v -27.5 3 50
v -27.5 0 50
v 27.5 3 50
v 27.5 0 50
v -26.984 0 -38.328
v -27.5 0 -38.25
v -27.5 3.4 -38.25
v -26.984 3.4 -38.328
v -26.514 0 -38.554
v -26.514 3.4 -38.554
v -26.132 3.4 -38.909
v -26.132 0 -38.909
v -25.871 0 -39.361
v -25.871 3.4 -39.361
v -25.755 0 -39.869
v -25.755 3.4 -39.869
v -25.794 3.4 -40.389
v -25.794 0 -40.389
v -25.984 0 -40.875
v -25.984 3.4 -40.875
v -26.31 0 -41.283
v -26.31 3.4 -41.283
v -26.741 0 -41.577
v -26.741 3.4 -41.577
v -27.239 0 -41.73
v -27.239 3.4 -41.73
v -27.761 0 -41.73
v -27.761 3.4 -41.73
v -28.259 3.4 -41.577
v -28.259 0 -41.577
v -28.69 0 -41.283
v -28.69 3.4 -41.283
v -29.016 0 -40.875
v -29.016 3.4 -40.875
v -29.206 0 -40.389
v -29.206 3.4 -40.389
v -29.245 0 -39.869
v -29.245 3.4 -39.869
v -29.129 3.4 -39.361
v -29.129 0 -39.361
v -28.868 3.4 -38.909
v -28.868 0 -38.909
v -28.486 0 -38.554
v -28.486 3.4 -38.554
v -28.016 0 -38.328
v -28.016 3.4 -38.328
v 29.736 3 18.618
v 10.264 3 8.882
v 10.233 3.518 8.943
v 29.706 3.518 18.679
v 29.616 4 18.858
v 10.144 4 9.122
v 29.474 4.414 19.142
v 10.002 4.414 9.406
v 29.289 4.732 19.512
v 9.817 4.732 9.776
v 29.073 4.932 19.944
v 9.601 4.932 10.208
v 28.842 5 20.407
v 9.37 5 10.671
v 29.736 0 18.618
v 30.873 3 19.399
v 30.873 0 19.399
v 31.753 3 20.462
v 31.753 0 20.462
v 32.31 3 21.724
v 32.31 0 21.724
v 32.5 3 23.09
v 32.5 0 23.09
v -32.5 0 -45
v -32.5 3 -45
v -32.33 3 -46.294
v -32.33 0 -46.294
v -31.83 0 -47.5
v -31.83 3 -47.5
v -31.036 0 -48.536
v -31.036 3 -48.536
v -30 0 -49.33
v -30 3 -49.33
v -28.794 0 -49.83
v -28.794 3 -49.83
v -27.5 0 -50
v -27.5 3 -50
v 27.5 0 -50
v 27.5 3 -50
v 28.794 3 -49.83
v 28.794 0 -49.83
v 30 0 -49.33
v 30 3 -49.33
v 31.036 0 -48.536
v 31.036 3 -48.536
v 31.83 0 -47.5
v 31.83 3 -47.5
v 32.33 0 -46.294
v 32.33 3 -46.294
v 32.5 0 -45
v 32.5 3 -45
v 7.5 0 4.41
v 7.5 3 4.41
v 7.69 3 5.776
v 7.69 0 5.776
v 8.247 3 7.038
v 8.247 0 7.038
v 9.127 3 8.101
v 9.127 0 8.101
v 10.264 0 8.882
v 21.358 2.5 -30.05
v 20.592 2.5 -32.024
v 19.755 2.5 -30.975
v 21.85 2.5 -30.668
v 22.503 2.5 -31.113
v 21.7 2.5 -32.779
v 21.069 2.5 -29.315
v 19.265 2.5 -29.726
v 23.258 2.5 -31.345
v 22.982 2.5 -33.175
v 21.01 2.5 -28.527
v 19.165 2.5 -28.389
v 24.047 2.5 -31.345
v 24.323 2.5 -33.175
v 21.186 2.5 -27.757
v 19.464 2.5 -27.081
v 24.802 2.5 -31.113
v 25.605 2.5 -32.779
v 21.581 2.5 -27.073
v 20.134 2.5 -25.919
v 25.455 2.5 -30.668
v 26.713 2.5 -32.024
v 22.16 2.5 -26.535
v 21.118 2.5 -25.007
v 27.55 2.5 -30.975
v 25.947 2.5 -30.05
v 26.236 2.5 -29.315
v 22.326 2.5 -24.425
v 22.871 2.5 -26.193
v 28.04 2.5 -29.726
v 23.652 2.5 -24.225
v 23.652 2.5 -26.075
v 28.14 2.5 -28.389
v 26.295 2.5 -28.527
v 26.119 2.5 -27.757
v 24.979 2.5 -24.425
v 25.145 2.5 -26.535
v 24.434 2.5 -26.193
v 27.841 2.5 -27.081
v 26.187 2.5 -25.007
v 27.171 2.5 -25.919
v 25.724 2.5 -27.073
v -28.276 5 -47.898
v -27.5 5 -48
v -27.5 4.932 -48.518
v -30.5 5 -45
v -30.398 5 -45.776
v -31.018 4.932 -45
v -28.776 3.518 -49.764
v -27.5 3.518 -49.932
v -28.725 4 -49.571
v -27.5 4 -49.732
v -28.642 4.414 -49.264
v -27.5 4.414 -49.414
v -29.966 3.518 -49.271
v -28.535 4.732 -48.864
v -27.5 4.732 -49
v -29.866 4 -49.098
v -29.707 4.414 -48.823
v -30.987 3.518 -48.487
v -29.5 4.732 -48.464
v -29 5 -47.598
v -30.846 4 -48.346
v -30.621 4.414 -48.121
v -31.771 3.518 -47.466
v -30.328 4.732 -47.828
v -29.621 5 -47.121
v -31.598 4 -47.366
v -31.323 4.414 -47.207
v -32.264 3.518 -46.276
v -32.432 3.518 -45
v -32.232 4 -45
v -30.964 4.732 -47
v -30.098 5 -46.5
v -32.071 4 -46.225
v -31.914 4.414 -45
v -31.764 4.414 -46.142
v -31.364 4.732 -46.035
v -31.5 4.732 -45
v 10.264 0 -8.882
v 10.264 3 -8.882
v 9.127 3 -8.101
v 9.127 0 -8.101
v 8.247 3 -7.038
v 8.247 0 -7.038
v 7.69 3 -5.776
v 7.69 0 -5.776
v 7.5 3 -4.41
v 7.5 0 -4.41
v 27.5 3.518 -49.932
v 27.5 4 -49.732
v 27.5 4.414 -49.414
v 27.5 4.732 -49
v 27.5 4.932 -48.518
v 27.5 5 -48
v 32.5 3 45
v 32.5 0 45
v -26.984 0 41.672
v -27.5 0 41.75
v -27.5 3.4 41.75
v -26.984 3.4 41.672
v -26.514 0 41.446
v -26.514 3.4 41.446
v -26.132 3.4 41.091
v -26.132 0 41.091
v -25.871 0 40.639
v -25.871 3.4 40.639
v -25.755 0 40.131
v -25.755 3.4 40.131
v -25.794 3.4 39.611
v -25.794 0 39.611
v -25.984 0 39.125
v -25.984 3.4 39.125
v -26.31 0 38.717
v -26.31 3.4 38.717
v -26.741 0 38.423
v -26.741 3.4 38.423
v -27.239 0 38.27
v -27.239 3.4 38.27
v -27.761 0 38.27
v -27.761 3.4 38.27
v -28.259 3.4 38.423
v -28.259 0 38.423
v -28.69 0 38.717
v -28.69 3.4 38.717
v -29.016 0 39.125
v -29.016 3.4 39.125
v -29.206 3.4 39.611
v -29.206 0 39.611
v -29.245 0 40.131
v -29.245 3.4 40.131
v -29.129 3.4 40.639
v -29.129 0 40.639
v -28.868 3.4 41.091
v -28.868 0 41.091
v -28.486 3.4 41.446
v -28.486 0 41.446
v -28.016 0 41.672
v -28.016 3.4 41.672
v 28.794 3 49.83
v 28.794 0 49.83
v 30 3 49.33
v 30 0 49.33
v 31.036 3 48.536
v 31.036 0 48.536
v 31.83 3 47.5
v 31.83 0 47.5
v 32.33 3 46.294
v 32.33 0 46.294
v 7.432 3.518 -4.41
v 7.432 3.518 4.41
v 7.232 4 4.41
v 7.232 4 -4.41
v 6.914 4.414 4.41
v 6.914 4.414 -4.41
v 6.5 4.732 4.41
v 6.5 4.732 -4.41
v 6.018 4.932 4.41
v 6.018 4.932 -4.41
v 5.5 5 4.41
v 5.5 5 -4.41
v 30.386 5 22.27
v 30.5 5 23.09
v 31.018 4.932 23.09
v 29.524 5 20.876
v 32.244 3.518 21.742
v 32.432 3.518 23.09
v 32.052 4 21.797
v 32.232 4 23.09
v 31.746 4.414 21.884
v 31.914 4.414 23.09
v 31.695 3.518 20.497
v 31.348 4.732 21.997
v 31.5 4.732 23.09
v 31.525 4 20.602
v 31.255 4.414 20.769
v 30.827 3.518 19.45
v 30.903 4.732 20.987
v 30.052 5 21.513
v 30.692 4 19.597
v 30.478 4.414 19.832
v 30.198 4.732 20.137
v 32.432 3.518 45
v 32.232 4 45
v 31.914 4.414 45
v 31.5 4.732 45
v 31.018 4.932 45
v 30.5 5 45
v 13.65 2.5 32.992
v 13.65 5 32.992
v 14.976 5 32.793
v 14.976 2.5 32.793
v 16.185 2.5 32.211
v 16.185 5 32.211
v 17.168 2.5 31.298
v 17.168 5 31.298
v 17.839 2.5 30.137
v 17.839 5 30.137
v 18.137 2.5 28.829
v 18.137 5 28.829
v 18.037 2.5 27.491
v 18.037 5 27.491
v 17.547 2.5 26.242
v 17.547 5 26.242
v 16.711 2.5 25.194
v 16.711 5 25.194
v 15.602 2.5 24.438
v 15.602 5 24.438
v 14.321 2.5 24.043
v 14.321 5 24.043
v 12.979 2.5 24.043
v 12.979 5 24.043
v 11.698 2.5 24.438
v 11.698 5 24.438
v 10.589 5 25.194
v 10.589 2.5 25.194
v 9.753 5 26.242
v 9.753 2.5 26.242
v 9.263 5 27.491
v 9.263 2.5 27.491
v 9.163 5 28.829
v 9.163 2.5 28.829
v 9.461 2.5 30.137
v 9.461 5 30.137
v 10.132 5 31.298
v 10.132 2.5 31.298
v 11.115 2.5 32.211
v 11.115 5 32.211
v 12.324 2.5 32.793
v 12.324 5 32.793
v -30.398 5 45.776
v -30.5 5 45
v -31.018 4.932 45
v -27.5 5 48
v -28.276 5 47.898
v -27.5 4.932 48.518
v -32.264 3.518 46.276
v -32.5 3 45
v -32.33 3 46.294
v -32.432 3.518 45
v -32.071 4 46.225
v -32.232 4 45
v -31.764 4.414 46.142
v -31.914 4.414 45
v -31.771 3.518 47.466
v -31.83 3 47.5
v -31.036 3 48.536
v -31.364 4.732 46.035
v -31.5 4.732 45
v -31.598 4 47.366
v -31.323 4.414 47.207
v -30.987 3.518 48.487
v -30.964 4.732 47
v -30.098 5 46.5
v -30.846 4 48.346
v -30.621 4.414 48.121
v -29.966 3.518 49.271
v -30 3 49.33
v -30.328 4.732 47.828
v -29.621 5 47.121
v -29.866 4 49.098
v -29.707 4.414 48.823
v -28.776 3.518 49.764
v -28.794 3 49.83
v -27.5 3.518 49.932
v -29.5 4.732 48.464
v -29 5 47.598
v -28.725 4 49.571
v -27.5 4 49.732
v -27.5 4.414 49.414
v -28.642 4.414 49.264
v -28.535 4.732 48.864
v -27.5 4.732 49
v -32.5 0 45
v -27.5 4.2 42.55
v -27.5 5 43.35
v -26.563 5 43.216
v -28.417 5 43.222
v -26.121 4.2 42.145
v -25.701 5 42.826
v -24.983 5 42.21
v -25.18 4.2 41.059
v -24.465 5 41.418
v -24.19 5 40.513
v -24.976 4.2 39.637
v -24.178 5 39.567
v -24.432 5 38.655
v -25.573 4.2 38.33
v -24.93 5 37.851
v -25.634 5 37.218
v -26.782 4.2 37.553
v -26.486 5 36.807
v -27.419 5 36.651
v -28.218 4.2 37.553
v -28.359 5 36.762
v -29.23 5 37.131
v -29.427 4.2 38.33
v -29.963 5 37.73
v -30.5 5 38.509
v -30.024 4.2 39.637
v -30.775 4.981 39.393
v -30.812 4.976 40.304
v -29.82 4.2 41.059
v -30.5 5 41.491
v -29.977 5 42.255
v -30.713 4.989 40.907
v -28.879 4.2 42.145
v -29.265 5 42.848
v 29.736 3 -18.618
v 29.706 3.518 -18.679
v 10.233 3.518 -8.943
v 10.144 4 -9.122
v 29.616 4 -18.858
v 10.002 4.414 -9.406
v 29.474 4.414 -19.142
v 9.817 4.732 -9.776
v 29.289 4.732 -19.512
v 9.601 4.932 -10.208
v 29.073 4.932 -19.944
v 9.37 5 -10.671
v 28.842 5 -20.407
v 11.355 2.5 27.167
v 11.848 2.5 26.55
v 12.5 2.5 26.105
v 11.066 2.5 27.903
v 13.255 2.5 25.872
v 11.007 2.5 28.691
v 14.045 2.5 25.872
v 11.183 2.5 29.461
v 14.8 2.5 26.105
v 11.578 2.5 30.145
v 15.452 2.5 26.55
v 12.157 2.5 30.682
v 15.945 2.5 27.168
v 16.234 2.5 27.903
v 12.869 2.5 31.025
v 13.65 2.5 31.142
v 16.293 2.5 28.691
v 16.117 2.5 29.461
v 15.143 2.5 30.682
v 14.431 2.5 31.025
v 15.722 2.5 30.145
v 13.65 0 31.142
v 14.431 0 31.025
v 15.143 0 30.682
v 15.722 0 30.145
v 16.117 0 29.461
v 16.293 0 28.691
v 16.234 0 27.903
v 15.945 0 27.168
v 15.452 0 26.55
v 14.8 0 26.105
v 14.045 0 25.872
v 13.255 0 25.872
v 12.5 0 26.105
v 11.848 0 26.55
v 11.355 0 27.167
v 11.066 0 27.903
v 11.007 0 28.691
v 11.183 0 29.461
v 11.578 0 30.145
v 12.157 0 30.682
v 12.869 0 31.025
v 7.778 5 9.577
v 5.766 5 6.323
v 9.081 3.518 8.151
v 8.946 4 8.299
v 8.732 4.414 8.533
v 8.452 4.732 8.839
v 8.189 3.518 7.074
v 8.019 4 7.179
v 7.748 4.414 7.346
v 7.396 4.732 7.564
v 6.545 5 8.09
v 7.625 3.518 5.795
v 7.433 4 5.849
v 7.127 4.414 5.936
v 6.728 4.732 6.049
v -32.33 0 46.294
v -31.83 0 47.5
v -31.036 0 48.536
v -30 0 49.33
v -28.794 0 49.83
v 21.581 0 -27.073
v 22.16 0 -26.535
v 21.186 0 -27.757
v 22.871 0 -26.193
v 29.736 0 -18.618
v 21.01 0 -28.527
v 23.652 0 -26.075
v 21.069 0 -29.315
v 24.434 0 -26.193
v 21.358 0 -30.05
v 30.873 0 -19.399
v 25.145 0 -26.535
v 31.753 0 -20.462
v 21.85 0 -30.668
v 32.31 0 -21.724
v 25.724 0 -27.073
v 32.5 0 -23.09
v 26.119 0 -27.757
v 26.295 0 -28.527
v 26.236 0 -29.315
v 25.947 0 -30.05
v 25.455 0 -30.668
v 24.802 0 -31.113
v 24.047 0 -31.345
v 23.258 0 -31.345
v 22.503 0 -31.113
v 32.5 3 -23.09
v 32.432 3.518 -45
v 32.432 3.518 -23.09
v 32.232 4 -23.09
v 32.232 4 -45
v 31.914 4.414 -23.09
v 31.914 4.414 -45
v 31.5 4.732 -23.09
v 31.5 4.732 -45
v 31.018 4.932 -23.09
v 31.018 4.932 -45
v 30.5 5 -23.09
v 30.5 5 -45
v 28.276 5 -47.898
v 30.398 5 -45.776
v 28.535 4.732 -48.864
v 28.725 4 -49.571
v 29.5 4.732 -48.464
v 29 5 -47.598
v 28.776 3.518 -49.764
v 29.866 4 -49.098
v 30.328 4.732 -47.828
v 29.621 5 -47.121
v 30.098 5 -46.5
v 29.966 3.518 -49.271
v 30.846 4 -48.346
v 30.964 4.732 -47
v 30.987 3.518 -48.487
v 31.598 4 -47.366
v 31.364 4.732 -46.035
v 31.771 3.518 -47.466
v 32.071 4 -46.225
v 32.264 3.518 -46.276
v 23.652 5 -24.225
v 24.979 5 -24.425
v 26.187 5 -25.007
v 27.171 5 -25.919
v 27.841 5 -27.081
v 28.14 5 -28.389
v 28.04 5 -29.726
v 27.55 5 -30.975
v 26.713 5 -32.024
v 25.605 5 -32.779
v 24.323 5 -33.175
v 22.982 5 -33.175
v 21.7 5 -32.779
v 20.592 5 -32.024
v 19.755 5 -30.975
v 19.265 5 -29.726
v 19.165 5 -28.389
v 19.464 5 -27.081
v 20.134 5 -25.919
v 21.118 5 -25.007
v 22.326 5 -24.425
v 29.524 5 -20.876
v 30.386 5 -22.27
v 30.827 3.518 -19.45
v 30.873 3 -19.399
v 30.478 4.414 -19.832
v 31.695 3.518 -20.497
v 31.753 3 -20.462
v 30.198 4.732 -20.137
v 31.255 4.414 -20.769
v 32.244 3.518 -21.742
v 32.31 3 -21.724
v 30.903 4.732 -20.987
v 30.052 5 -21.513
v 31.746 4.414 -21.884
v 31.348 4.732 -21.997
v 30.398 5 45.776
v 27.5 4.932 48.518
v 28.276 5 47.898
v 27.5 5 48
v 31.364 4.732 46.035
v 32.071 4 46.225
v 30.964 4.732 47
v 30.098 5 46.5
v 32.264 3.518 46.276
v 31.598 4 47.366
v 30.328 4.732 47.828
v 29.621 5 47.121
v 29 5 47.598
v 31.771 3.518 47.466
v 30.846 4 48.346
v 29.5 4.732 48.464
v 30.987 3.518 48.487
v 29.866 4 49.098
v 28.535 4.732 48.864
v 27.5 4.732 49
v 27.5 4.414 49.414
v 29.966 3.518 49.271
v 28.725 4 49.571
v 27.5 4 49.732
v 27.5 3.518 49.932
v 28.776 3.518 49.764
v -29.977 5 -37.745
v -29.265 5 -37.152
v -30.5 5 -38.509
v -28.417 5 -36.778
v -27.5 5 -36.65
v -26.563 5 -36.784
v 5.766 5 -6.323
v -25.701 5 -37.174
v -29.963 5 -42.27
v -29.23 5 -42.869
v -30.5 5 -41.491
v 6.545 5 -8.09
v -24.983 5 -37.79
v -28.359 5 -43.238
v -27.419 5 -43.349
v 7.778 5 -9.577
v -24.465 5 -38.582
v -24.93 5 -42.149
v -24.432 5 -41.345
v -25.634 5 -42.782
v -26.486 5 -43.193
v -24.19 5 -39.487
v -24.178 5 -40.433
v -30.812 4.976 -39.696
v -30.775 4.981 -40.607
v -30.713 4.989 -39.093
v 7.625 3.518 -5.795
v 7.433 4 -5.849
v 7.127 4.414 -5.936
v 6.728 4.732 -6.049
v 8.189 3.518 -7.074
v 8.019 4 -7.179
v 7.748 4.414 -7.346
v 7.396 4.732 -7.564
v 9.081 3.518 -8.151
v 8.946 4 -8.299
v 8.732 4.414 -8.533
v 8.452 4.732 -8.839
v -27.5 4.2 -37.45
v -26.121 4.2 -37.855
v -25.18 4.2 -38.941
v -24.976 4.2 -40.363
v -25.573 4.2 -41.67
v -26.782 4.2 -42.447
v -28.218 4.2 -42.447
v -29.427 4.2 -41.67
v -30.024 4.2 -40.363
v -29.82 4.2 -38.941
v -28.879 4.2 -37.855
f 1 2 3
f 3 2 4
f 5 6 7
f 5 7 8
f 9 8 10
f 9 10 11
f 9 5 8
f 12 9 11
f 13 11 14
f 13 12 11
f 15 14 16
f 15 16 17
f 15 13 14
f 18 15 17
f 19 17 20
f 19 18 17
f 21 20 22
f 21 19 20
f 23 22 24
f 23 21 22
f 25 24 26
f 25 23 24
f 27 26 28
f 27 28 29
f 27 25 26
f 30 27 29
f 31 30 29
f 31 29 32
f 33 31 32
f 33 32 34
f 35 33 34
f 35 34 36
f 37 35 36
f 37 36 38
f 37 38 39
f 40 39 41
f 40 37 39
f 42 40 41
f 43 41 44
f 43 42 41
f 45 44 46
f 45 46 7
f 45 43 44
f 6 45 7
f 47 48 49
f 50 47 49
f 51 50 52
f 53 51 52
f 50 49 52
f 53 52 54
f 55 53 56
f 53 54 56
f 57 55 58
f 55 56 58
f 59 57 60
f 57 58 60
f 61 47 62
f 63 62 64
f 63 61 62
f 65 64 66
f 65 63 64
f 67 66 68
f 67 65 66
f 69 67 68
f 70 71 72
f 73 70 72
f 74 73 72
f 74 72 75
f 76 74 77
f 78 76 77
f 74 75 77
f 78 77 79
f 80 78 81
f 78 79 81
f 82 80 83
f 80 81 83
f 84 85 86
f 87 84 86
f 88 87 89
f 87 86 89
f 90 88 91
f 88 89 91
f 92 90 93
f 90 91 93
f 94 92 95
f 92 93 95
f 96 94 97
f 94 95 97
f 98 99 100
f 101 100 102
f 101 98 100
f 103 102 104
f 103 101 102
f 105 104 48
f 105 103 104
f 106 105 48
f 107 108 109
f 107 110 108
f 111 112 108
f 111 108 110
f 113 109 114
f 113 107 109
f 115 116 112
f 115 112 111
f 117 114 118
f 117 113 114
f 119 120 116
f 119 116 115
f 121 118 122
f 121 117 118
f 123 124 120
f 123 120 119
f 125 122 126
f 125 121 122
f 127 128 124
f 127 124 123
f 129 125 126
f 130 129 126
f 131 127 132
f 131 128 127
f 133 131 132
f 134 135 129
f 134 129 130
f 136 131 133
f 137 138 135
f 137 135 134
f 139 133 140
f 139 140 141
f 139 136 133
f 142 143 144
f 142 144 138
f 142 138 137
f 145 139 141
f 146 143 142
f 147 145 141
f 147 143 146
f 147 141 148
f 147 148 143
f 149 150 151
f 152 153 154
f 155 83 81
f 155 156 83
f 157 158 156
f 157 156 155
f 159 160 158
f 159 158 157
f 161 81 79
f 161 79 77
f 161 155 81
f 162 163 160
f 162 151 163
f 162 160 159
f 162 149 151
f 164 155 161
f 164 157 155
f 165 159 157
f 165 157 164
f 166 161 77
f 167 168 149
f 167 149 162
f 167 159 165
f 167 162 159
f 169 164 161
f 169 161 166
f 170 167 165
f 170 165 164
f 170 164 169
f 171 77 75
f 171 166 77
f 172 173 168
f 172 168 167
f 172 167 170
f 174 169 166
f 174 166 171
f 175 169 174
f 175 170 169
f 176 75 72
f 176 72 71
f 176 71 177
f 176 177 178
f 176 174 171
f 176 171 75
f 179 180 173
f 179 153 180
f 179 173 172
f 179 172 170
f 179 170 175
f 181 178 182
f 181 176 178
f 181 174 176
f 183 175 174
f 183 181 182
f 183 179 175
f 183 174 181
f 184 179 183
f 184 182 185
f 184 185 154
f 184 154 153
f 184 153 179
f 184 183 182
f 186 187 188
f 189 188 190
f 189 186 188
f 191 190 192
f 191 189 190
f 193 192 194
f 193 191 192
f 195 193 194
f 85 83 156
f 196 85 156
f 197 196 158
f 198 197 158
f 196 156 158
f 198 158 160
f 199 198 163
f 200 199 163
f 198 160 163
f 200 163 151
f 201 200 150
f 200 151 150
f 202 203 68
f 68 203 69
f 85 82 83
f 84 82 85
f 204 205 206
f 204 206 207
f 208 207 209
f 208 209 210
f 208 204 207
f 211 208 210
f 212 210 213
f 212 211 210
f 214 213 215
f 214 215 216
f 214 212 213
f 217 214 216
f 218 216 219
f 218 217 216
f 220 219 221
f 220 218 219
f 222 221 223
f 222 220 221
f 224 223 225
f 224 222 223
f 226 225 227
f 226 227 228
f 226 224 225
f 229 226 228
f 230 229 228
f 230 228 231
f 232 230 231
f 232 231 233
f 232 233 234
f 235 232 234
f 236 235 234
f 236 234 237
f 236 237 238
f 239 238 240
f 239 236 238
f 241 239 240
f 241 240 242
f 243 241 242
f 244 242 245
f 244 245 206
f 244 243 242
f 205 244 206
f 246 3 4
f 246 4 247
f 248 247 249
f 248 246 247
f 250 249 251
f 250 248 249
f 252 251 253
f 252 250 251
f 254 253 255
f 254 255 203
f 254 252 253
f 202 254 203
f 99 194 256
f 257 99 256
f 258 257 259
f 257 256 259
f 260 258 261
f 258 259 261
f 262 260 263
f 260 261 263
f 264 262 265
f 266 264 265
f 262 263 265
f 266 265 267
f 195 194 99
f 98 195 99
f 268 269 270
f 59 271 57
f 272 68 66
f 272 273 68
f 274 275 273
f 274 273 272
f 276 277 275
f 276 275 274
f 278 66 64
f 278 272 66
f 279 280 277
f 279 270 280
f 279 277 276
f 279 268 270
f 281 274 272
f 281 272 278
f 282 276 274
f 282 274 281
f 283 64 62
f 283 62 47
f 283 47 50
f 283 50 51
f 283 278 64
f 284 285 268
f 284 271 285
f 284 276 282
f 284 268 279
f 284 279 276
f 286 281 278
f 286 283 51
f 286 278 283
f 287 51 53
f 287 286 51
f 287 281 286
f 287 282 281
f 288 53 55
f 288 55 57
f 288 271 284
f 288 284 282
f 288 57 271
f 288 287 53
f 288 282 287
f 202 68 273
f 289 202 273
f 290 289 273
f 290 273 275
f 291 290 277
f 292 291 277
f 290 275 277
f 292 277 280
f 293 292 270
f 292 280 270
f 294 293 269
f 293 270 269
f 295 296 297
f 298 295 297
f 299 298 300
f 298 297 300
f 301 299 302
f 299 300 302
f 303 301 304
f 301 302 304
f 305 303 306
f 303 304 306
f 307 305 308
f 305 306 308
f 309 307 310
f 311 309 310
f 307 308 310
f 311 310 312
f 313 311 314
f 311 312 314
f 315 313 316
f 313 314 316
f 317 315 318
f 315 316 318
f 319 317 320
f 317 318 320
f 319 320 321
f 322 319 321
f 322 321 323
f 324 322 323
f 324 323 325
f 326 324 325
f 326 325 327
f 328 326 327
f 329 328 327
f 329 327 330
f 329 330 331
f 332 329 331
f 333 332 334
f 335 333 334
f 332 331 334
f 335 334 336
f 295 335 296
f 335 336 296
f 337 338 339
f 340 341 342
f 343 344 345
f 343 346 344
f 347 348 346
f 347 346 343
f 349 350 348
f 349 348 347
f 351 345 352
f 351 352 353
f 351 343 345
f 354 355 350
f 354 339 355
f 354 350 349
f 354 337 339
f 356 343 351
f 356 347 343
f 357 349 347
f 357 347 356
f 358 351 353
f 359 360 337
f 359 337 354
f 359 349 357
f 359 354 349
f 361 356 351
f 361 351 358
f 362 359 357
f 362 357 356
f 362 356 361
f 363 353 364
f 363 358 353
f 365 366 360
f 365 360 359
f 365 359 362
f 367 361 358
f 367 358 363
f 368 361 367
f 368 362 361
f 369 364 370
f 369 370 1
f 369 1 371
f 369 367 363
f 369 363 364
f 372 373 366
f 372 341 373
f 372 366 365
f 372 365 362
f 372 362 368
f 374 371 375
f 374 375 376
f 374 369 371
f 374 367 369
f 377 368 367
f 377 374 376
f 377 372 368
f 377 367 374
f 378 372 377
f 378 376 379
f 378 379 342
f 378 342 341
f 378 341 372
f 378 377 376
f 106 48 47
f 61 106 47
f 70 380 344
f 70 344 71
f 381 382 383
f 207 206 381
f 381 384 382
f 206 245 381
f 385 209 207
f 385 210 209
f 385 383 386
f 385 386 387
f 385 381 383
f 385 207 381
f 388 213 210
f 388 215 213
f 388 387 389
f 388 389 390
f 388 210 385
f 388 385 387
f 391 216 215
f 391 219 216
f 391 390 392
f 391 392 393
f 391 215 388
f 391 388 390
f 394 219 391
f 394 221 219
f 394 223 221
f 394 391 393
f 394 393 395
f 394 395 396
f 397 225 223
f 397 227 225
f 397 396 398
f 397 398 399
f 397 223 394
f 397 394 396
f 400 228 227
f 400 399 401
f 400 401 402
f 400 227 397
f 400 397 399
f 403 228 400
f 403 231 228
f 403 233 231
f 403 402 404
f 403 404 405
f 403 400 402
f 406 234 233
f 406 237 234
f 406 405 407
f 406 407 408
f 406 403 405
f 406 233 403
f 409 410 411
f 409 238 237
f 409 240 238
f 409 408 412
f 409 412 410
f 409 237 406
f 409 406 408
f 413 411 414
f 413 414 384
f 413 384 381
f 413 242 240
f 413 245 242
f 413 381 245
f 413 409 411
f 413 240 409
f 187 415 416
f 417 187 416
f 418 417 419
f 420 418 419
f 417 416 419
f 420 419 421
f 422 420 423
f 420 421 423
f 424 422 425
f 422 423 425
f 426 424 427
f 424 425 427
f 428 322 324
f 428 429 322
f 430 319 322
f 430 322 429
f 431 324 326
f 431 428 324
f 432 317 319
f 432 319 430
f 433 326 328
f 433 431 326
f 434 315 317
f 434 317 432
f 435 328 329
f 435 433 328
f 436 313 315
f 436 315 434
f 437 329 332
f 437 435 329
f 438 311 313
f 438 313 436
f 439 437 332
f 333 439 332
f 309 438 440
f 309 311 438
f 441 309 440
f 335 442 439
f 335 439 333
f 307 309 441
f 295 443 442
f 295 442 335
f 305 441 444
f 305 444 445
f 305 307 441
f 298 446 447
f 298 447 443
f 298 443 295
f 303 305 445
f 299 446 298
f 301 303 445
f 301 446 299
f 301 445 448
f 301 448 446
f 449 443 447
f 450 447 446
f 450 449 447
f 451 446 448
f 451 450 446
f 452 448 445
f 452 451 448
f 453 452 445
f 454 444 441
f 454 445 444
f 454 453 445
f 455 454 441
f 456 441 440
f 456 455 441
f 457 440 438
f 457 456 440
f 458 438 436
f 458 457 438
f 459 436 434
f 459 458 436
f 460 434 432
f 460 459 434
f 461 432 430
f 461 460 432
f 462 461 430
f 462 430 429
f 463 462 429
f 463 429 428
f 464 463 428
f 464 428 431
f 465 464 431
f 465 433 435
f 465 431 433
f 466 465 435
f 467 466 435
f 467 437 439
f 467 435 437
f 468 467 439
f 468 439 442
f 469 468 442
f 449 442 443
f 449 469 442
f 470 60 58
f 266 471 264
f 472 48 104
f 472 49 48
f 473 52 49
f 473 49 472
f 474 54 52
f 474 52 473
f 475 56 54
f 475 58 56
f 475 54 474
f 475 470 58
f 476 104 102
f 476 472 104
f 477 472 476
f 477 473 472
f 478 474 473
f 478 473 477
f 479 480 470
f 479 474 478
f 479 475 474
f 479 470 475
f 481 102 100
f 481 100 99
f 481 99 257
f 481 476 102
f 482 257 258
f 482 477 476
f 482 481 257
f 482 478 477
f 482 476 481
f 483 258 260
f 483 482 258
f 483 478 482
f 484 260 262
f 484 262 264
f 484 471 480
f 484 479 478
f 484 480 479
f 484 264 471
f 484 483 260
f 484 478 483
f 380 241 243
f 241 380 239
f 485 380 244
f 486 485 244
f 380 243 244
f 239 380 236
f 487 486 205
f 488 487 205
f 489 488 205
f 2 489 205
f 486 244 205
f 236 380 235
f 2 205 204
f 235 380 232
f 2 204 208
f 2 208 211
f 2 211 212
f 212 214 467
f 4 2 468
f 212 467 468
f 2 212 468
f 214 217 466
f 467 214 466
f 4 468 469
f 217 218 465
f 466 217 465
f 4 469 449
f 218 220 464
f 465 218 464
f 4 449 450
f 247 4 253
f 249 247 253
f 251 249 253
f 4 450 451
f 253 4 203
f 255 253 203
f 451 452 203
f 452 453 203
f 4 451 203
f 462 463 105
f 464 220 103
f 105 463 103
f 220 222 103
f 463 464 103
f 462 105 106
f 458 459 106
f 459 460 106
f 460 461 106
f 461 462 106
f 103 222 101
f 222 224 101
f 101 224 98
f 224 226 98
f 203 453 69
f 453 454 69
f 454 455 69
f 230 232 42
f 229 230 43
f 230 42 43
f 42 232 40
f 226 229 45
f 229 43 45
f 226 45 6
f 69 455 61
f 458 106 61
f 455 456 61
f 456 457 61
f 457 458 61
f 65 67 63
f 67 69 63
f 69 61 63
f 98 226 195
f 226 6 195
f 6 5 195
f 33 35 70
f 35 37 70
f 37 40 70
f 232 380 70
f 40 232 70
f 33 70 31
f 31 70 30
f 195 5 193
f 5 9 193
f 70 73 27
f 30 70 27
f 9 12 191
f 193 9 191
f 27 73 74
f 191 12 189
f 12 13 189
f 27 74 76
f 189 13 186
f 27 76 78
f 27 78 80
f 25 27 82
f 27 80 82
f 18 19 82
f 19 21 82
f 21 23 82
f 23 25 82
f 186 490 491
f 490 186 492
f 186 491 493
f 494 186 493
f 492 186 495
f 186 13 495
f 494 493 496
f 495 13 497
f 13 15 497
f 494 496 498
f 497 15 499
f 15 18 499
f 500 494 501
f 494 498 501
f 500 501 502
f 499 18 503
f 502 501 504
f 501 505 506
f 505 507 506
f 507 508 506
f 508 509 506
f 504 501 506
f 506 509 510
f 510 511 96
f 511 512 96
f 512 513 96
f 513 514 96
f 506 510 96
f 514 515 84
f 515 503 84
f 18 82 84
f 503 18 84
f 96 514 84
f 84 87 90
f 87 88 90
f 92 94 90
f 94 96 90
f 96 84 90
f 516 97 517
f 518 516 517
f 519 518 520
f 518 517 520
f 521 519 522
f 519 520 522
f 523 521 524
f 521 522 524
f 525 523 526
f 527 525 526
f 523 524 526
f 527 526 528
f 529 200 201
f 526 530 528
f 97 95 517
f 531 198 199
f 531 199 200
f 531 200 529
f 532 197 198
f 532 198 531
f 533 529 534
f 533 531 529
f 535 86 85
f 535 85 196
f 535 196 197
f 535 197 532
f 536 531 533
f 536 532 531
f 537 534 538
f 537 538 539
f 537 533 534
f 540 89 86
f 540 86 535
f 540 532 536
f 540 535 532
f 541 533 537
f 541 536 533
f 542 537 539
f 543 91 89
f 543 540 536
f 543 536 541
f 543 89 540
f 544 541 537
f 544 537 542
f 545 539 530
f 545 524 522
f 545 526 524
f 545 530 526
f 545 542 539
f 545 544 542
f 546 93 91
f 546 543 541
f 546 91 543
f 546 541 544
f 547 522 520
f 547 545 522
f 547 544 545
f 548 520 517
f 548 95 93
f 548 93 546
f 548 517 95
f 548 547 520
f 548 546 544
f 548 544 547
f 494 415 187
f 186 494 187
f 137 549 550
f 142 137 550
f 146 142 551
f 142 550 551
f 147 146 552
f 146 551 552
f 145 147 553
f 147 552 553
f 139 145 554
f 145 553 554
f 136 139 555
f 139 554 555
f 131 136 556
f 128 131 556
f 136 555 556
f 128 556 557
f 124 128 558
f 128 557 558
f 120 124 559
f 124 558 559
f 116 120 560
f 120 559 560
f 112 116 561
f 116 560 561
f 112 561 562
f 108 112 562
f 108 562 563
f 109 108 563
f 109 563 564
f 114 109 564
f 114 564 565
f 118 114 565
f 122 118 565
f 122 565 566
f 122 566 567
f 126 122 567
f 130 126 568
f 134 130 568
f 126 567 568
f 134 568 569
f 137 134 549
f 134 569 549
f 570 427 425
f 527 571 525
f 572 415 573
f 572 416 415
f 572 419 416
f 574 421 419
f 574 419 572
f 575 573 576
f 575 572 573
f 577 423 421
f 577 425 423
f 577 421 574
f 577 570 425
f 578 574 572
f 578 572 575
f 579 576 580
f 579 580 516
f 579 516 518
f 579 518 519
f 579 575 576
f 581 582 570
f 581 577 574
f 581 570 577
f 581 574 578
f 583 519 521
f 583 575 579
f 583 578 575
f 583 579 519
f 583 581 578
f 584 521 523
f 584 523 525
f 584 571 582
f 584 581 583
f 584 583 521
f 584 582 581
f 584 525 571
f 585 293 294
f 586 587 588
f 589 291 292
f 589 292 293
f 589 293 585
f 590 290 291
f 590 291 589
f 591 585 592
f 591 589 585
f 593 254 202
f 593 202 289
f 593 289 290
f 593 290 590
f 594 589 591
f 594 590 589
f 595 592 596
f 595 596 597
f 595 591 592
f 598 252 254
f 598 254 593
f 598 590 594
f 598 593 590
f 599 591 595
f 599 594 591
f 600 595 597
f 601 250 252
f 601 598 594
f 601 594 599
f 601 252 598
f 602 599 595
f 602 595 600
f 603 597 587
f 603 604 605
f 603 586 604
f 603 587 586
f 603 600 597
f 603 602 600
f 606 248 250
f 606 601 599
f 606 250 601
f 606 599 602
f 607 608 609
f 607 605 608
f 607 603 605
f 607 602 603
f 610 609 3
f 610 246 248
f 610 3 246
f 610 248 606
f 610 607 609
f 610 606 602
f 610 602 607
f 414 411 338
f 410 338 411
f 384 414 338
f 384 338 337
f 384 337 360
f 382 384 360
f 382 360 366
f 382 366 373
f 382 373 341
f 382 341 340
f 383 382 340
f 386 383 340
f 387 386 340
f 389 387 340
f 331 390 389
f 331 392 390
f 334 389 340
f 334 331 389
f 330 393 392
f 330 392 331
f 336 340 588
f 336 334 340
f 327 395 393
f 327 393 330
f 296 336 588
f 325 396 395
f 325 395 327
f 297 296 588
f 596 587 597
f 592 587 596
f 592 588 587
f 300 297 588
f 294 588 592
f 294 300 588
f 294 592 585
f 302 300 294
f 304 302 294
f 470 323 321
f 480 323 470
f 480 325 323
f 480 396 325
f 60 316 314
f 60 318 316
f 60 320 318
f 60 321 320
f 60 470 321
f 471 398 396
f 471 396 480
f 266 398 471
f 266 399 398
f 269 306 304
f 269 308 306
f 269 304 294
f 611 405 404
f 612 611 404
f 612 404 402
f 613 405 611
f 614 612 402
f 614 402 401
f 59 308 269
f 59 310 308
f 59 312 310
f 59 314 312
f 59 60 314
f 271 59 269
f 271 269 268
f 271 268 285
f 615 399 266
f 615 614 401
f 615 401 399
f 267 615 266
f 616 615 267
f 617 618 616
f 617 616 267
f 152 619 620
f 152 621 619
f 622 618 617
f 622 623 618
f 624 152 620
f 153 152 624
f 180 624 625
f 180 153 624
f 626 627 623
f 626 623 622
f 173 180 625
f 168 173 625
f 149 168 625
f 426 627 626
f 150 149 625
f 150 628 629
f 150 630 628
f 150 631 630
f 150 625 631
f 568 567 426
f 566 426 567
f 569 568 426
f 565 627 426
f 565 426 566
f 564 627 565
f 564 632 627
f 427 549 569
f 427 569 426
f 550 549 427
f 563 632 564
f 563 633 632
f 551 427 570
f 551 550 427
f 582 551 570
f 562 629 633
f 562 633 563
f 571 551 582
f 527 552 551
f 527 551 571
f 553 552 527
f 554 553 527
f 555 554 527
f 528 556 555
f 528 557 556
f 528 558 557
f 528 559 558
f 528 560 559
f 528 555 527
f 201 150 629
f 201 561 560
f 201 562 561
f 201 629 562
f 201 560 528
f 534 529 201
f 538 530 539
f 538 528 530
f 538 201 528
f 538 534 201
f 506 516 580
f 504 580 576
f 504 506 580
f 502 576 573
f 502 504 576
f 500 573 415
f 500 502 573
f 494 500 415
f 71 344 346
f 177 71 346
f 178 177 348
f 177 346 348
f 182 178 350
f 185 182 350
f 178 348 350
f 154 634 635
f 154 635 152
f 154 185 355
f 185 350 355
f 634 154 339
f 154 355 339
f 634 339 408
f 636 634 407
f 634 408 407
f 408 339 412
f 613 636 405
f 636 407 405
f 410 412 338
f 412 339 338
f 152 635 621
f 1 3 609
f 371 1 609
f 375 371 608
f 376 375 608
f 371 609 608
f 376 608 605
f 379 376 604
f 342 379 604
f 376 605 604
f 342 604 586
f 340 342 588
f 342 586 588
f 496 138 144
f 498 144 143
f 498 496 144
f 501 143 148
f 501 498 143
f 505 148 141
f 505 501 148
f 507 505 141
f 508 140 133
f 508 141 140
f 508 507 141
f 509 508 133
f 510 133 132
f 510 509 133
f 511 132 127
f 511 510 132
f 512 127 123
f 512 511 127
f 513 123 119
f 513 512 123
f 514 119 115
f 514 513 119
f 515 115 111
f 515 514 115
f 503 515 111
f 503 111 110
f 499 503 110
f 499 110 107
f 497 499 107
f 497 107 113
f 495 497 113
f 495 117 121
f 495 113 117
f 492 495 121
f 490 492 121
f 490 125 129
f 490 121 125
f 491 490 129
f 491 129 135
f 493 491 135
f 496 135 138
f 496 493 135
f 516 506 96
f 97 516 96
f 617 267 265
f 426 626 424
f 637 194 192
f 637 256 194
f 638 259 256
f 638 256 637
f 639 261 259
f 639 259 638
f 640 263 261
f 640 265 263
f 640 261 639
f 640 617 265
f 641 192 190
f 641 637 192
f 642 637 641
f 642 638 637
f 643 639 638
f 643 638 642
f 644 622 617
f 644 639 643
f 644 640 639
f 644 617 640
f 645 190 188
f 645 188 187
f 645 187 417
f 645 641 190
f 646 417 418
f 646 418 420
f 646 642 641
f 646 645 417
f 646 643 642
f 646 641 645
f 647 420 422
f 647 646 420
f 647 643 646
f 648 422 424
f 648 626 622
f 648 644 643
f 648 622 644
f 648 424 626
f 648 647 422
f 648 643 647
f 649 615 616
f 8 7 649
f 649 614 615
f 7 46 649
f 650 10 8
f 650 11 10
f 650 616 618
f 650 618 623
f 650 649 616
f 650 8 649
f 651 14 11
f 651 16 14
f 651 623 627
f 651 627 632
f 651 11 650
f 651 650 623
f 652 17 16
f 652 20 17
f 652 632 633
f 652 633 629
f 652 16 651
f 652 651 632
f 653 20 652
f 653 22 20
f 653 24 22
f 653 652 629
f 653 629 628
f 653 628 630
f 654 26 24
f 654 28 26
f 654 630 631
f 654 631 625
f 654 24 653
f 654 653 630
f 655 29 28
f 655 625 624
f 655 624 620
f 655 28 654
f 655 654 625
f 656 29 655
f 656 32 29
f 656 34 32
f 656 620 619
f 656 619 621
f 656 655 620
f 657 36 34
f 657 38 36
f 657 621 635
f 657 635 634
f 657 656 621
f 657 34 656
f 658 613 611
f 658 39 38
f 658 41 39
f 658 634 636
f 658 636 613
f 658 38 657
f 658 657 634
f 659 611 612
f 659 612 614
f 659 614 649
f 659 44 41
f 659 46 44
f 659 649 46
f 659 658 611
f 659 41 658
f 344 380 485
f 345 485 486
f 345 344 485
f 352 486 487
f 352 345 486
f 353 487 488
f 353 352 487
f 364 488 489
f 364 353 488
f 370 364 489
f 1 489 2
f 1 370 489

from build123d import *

# Parameters (mm, degrees)
SKETCH2_W           = 65
SKETCH2_H           = 100
SKETCH2_R           = 1.75
SKETCH2_R_2         = 2.65
BOSS_EXTRUDE1_DEPTH = 5
SKETCH3_R           = 4.5
CUT_EXTRUDE1_DEPTH  = 2.5
FILLET1_R           = 5
CHAMFER1_SIZE       = 1.6
CUT_EXTRUDE2_DEPTH  = 60.843546018
FILLET3_R           = 5
FILLET2_R           = 2


with BuildPart() as part:
    # Sketch2 → Boss-Extrude1 (new body)
    with BuildSketch(Plane(origin=(0, 0, 0), x_dir=(1, 0, 0), z_dir=(0, 1, 0))):
        Rectangle(SKETCH2_W, SKETCH2_H)
        with Locations(Location((-27.5, 40, 0), (0, 0, 270))):
            Circle(SKETCH2_R, mode=Mode.SUBTRACT)
        with Locations(Location((-27.5, -40, 0), (0, 0, 270))):
            Circle(SKETCH2_R, mode=Mode.SUBTRACT)
        with Locations(Location((23.6525, 28.725, 0), (0, 0, 270))):
            Circle(SKETCH2_R_2, mode=Mode.SUBTRACT)
        with Locations(Location((13.65, -28.4925, 0), (0, 0, 270))):
            Circle(SKETCH2_R_2, mode=Mode.SUBTRACT)
    extrude(amount=BOSS_EXTRUDE1_DEPTH)

    # Sketch3 → Cut-Extrude1 (cut)
    with BuildSketch(Plane(origin=(0, 5, 0), x_dir=(1, 0, 0), z_dir=(0, 1, 0))):
        with Locations(Location((23.6525, 28.725, 0), (0, 0, 270))):
            Circle(SKETCH3_R)
        with Locations(Location((13.65, -28.4925, 0), (0, 0, 270))):
            Circle(SKETCH3_R)
    extrude(amount=-CUT_EXTRUDE1_DEPTH, mode=Mode.SUBTRACT)

    # Fillet1
    fillet1_edges = [part.edges().sort_by_distance(p)[0] for p in [
        (32.5, 2.5, 50),
        (-32.5, 2.5, 50),
        (-32.5, 2.5, -50),
        (32.5, 2.5, -50),
    ]]
    fillet(fillet1_edges, radius=FILLET1_R)

    # Chamfer1
    chamfer1_edges = [part.edges().sort_by_distance(p)[0] for p in [
        (-27.5, 5, -41.75),
        (-27.5, 5, 38.25),
    ]]
    chamfer(chamfer1_edges, length=CHAMFER1_SIZE)

    # Sketch4 → Cut-Extrude2 (cut, through all)
    with BuildSketch(Plane(origin=(0, 5, 0), x_dir=(1, 0, 0), z_dir=(0, 1, 0))):
        Polygon((7.5, 7.5), (7.5, -7.5), (32.5, -20), (32.5, 20), align=None)
    extrude(amount=-CUT_EXTRUDE2_DEPTH, mode=Mode.SUBTRACT)

    # Fillet3
    fillet3_edges = [part.edges().sort_by_distance(p)[0] for p in [
        (7.5, 2.5, -7.5),
        (32.5, 2.5, -20),
        (32.5, 2.5, 20),
        (7.5, 2.5, 7.5),
    ]]
    fillet(fillet3_edges, radius=FILLET3_R)

    # Fillet2
    # the kernel refuses this fillet: 2 mm, written as the material it takes off along each edge
    with BuildSketch(Plane(origin=(12.5, 5, 4.409830056), x_dir=(-0.447213595499958, 0, 0.894427190999916), z_dir=(0.894427190999916, 0, 0.447213595499958))) as fillet2_piece_1:
        with BuildLine():
            CenterArc((5 + FILLET2_R, FILLET2_R), FILLET2_R, 180, 90)
            Line((5, FILLET2_R), (5, 0))
            Line((5, 0), (5 + FILLET2_R, 0))
        make_face()
    revolve(axis=Axis((12.5, 5, 4.409830056), (0, -1, 0)), revolution_arc=63.434948823, mode=Mode.SUBTRACT)
    with BuildSketch(Plane(origin=(12.5, 5, -4.409830056), x_dir=(-1, 0, 0), z_dir=(0, 0, 1))) as fillet2_piece_2:
        with BuildLine():
            CenterArc((5 + FILLET2_R, FILLET2_R), FILLET2_R, 180, 90)
            Line((5, FILLET2_R), (5, 0))
            Line((5, 0), (5 + FILLET2_R, 0))
        make_face()
    revolve(axis=Axis((12.5, 5, -4.409830056), (0, -1, 0)), revolution_arc=63.434948823, mode=Mode.SUBTRACT)
    with BuildSketch(Plane(origin=(32.5, 5, 23.090169944), x_dir=(-1, 0, 0), z_dir=(0, 0, 1)), Plane(origin=(32.5, 5, -45), x_dir=(-1, 0, 0), z_dir=(0, 0, 1))) as fillet2_piece_3:
        with BuildLine():
            CenterArc((FILLET2_R, FILLET2_R), FILLET2_R, 180, 90)
            Line((0, FILLET2_R), (0, 0))
            Line((0, 0), (FILLET2_R, 0))
        make_face()
    extrude(amount=21.909830056, mode=Mode.SUBTRACT)
    with BuildSketch(Plane(origin=(27.5, 5, 50), x_dir=(0, 0, -1), z_dir=(-1, 0, 0)), Plane(origin=(-27.5, 5, -50), x_dir=(0, 0, 1), z_dir=(1, 0, 0))) as fillet2_piece_4:
        with BuildLine():
            CenterArc((FILLET2_R, FILLET2_R), FILLET2_R, 180, 90)
            Line((0, FILLET2_R), (0, 0))
            Line((0, 0), (FILLET2_R, 0))
        make_face()
    extrude(amount=55, mode=Mode.SUBTRACT)
    with BuildSketch(Plane(origin=(-32.5, 5, 45), x_dir=(1, 0, 0), z_dir=(0, 0, -1))) as fillet2_piece_5:
        with BuildLine():
            CenterArc((FILLET2_R, FILLET2_R), FILLET2_R, 180, 90)
            Line((0, FILLET2_R), (0, 0))
            Line((0, 0), (FILLET2_R, 0))
        make_face()
    extrude(amount=90, mode=Mode.SUBTRACT)
    with BuildSketch(Plane(origin=(-27.5, 5, 45), x_dir=(-1, 0, 0), z_dir=(0, 0, -1))) as fillet2_piece_6:
        with BuildLine():
            CenterArc((5 - FILLET2_R, -FILLET2_R), FILLET2_R, 0, 90)
            Line((5, -FILLET2_R), (5, 0))
            Line((5, 0), (5 - FILLET2_R, 0))
        make_face()
    revolve(axis=Axis((-27.5, 5, 45), (0, 1, 0)), revolution_arc=90, mode=Mode.SUBTRACT)
    with BuildSketch(Plane(origin=(27.5, 5, -45), x_dir=(0, 0, -1), z_dir=(-1, 0, 0))) as fillet2_piece_7:
        with BuildLine():
            CenterArc((5 - FILLET2_R, FILLET2_R), FILLET2_R, 270, 90)
            Line((5, FILLET2_R), (5, 0))
            Line((5, 0), (5 - FILLET2_R, 0))
        make_face()
    revolve(axis=Axis((27.5, 5, -45), (0, -1, 0)), revolution_arc=90, mode=Mode.SUBTRACT)
    with BuildSketch(Plane(origin=(-27.5, 5, -45), x_dir=(0, 0, -1), z_dir=(1, 0, 0))) as fillet2_piece_8:
        with BuildLine():
            CenterArc((5 - FILLET2_R, -FILLET2_R), FILLET2_R, 0, 90)
            Line((5, -FILLET2_R), (5, 0))
            Line((5, 0), (5 - FILLET2_R, 0))
        make_face()
    revolve(axis=Axis((-27.5, 5, -45), (0, 1, 0)), revolution_arc=90, mode=Mode.SUBTRACT)
    with BuildSketch(Plane(origin=(27.5, 5, 45), x_dir=(1, 0, 0), z_dir=(0, 0, -1))) as fillet2_piece_9:
        with BuildLine():
            CenterArc((5 - FILLET2_R, FILLET2_R), FILLET2_R, 270, 90)
            Line((5, FILLET2_R), (5, 0))
            Line((5, 0), (5 - FILLET2_R, 0))
        make_face()
    revolve(axis=Axis((27.5, 5, 45), (0, -1, 0)), revolution_arc=90, mode=Mode.SUBTRACT)
    with BuildSketch(Plane(origin=(29.736067977, 5, -18.618033989), x_dir=(-0.4472135954999579, 0, -0.8944271909999159), z_dir=(-0.894427190999916, 0, 0.4472135954999579)), Plane(origin=(10.263932023, 5, 8.881966011), x_dir=(-0.4472135954999579, 0, 0.894427190999916), z_dir=(0.894427190999916, 0, 0.4472135954999579))) as fillet2_piece_10:
        with BuildLine():
            CenterArc((FILLET2_R, FILLET2_R), FILLET2_R, 180, 90)
            Line((0, FILLET2_R), (0, 0))
            Line((0, 0), (FILLET2_R, 0))
        make_face()
    extrude(amount=21.770509831, mode=Mode.SUBTRACT)
    with BuildSketch(Plane(origin=(7.5, 5, -4.409830056), x_dir=(-1, 0, 0), z_dir=(0, 0, 1))) as fillet2_piece_11:
        with BuildLine():
            CenterArc((FILLET2_R, FILLET2_R), FILLET2_R, 180, 90)
            Line((0, FILLET2_R), (0, 0))
            Line((0, 0), (FILLET2_R, 0))
        make_face()
    extrude(amount=8.819660113, mode=Mode.SUBTRACT)
    with BuildSketch(Plane(origin=(27.5, 5, 23.090169944), x_dir=(1, 0, 0), z_dir=(0, 0, 1))) as fillet2_piece_12:
        with BuildLine():
            CenterArc((5 - FILLET2_R, -FILLET2_R), FILLET2_R, 0, 90)
            Line((5, -FILLET2_R), (5, 0))
            Line((5, 0), (5 - FILLET2_R, 0))
        make_face()
    revolve(axis=Axis((27.5, 5, 23.090169944), (0, 1, 0)), revolution_arc=63.434948823, mode=Mode.SUBTRACT)
    with BuildSketch(Plane(origin=(27.5, 5, -23.090169944), x_dir=(0.44721359549995743, 0, 0.8944271909999162), z_dir=(-0.8944271909999162, 0, 0.44721359549995743))) as fillet2_piece_13:
        with BuildLine():
            CenterArc((5 - FILLET2_R, -FILLET2_R), FILLET2_R, 0, 90)
            Line((5, -FILLET2_R), (5, 0))
            Line((5, 0), (5 - FILLET2_R, 0))
        make_face()
    revolve(axis=Axis((27.5, 5, -23.090169944), (0, 1, 0)), revolution_arc=63.434948823, mode=Mode.SUBTRACT)


solid = part.part
